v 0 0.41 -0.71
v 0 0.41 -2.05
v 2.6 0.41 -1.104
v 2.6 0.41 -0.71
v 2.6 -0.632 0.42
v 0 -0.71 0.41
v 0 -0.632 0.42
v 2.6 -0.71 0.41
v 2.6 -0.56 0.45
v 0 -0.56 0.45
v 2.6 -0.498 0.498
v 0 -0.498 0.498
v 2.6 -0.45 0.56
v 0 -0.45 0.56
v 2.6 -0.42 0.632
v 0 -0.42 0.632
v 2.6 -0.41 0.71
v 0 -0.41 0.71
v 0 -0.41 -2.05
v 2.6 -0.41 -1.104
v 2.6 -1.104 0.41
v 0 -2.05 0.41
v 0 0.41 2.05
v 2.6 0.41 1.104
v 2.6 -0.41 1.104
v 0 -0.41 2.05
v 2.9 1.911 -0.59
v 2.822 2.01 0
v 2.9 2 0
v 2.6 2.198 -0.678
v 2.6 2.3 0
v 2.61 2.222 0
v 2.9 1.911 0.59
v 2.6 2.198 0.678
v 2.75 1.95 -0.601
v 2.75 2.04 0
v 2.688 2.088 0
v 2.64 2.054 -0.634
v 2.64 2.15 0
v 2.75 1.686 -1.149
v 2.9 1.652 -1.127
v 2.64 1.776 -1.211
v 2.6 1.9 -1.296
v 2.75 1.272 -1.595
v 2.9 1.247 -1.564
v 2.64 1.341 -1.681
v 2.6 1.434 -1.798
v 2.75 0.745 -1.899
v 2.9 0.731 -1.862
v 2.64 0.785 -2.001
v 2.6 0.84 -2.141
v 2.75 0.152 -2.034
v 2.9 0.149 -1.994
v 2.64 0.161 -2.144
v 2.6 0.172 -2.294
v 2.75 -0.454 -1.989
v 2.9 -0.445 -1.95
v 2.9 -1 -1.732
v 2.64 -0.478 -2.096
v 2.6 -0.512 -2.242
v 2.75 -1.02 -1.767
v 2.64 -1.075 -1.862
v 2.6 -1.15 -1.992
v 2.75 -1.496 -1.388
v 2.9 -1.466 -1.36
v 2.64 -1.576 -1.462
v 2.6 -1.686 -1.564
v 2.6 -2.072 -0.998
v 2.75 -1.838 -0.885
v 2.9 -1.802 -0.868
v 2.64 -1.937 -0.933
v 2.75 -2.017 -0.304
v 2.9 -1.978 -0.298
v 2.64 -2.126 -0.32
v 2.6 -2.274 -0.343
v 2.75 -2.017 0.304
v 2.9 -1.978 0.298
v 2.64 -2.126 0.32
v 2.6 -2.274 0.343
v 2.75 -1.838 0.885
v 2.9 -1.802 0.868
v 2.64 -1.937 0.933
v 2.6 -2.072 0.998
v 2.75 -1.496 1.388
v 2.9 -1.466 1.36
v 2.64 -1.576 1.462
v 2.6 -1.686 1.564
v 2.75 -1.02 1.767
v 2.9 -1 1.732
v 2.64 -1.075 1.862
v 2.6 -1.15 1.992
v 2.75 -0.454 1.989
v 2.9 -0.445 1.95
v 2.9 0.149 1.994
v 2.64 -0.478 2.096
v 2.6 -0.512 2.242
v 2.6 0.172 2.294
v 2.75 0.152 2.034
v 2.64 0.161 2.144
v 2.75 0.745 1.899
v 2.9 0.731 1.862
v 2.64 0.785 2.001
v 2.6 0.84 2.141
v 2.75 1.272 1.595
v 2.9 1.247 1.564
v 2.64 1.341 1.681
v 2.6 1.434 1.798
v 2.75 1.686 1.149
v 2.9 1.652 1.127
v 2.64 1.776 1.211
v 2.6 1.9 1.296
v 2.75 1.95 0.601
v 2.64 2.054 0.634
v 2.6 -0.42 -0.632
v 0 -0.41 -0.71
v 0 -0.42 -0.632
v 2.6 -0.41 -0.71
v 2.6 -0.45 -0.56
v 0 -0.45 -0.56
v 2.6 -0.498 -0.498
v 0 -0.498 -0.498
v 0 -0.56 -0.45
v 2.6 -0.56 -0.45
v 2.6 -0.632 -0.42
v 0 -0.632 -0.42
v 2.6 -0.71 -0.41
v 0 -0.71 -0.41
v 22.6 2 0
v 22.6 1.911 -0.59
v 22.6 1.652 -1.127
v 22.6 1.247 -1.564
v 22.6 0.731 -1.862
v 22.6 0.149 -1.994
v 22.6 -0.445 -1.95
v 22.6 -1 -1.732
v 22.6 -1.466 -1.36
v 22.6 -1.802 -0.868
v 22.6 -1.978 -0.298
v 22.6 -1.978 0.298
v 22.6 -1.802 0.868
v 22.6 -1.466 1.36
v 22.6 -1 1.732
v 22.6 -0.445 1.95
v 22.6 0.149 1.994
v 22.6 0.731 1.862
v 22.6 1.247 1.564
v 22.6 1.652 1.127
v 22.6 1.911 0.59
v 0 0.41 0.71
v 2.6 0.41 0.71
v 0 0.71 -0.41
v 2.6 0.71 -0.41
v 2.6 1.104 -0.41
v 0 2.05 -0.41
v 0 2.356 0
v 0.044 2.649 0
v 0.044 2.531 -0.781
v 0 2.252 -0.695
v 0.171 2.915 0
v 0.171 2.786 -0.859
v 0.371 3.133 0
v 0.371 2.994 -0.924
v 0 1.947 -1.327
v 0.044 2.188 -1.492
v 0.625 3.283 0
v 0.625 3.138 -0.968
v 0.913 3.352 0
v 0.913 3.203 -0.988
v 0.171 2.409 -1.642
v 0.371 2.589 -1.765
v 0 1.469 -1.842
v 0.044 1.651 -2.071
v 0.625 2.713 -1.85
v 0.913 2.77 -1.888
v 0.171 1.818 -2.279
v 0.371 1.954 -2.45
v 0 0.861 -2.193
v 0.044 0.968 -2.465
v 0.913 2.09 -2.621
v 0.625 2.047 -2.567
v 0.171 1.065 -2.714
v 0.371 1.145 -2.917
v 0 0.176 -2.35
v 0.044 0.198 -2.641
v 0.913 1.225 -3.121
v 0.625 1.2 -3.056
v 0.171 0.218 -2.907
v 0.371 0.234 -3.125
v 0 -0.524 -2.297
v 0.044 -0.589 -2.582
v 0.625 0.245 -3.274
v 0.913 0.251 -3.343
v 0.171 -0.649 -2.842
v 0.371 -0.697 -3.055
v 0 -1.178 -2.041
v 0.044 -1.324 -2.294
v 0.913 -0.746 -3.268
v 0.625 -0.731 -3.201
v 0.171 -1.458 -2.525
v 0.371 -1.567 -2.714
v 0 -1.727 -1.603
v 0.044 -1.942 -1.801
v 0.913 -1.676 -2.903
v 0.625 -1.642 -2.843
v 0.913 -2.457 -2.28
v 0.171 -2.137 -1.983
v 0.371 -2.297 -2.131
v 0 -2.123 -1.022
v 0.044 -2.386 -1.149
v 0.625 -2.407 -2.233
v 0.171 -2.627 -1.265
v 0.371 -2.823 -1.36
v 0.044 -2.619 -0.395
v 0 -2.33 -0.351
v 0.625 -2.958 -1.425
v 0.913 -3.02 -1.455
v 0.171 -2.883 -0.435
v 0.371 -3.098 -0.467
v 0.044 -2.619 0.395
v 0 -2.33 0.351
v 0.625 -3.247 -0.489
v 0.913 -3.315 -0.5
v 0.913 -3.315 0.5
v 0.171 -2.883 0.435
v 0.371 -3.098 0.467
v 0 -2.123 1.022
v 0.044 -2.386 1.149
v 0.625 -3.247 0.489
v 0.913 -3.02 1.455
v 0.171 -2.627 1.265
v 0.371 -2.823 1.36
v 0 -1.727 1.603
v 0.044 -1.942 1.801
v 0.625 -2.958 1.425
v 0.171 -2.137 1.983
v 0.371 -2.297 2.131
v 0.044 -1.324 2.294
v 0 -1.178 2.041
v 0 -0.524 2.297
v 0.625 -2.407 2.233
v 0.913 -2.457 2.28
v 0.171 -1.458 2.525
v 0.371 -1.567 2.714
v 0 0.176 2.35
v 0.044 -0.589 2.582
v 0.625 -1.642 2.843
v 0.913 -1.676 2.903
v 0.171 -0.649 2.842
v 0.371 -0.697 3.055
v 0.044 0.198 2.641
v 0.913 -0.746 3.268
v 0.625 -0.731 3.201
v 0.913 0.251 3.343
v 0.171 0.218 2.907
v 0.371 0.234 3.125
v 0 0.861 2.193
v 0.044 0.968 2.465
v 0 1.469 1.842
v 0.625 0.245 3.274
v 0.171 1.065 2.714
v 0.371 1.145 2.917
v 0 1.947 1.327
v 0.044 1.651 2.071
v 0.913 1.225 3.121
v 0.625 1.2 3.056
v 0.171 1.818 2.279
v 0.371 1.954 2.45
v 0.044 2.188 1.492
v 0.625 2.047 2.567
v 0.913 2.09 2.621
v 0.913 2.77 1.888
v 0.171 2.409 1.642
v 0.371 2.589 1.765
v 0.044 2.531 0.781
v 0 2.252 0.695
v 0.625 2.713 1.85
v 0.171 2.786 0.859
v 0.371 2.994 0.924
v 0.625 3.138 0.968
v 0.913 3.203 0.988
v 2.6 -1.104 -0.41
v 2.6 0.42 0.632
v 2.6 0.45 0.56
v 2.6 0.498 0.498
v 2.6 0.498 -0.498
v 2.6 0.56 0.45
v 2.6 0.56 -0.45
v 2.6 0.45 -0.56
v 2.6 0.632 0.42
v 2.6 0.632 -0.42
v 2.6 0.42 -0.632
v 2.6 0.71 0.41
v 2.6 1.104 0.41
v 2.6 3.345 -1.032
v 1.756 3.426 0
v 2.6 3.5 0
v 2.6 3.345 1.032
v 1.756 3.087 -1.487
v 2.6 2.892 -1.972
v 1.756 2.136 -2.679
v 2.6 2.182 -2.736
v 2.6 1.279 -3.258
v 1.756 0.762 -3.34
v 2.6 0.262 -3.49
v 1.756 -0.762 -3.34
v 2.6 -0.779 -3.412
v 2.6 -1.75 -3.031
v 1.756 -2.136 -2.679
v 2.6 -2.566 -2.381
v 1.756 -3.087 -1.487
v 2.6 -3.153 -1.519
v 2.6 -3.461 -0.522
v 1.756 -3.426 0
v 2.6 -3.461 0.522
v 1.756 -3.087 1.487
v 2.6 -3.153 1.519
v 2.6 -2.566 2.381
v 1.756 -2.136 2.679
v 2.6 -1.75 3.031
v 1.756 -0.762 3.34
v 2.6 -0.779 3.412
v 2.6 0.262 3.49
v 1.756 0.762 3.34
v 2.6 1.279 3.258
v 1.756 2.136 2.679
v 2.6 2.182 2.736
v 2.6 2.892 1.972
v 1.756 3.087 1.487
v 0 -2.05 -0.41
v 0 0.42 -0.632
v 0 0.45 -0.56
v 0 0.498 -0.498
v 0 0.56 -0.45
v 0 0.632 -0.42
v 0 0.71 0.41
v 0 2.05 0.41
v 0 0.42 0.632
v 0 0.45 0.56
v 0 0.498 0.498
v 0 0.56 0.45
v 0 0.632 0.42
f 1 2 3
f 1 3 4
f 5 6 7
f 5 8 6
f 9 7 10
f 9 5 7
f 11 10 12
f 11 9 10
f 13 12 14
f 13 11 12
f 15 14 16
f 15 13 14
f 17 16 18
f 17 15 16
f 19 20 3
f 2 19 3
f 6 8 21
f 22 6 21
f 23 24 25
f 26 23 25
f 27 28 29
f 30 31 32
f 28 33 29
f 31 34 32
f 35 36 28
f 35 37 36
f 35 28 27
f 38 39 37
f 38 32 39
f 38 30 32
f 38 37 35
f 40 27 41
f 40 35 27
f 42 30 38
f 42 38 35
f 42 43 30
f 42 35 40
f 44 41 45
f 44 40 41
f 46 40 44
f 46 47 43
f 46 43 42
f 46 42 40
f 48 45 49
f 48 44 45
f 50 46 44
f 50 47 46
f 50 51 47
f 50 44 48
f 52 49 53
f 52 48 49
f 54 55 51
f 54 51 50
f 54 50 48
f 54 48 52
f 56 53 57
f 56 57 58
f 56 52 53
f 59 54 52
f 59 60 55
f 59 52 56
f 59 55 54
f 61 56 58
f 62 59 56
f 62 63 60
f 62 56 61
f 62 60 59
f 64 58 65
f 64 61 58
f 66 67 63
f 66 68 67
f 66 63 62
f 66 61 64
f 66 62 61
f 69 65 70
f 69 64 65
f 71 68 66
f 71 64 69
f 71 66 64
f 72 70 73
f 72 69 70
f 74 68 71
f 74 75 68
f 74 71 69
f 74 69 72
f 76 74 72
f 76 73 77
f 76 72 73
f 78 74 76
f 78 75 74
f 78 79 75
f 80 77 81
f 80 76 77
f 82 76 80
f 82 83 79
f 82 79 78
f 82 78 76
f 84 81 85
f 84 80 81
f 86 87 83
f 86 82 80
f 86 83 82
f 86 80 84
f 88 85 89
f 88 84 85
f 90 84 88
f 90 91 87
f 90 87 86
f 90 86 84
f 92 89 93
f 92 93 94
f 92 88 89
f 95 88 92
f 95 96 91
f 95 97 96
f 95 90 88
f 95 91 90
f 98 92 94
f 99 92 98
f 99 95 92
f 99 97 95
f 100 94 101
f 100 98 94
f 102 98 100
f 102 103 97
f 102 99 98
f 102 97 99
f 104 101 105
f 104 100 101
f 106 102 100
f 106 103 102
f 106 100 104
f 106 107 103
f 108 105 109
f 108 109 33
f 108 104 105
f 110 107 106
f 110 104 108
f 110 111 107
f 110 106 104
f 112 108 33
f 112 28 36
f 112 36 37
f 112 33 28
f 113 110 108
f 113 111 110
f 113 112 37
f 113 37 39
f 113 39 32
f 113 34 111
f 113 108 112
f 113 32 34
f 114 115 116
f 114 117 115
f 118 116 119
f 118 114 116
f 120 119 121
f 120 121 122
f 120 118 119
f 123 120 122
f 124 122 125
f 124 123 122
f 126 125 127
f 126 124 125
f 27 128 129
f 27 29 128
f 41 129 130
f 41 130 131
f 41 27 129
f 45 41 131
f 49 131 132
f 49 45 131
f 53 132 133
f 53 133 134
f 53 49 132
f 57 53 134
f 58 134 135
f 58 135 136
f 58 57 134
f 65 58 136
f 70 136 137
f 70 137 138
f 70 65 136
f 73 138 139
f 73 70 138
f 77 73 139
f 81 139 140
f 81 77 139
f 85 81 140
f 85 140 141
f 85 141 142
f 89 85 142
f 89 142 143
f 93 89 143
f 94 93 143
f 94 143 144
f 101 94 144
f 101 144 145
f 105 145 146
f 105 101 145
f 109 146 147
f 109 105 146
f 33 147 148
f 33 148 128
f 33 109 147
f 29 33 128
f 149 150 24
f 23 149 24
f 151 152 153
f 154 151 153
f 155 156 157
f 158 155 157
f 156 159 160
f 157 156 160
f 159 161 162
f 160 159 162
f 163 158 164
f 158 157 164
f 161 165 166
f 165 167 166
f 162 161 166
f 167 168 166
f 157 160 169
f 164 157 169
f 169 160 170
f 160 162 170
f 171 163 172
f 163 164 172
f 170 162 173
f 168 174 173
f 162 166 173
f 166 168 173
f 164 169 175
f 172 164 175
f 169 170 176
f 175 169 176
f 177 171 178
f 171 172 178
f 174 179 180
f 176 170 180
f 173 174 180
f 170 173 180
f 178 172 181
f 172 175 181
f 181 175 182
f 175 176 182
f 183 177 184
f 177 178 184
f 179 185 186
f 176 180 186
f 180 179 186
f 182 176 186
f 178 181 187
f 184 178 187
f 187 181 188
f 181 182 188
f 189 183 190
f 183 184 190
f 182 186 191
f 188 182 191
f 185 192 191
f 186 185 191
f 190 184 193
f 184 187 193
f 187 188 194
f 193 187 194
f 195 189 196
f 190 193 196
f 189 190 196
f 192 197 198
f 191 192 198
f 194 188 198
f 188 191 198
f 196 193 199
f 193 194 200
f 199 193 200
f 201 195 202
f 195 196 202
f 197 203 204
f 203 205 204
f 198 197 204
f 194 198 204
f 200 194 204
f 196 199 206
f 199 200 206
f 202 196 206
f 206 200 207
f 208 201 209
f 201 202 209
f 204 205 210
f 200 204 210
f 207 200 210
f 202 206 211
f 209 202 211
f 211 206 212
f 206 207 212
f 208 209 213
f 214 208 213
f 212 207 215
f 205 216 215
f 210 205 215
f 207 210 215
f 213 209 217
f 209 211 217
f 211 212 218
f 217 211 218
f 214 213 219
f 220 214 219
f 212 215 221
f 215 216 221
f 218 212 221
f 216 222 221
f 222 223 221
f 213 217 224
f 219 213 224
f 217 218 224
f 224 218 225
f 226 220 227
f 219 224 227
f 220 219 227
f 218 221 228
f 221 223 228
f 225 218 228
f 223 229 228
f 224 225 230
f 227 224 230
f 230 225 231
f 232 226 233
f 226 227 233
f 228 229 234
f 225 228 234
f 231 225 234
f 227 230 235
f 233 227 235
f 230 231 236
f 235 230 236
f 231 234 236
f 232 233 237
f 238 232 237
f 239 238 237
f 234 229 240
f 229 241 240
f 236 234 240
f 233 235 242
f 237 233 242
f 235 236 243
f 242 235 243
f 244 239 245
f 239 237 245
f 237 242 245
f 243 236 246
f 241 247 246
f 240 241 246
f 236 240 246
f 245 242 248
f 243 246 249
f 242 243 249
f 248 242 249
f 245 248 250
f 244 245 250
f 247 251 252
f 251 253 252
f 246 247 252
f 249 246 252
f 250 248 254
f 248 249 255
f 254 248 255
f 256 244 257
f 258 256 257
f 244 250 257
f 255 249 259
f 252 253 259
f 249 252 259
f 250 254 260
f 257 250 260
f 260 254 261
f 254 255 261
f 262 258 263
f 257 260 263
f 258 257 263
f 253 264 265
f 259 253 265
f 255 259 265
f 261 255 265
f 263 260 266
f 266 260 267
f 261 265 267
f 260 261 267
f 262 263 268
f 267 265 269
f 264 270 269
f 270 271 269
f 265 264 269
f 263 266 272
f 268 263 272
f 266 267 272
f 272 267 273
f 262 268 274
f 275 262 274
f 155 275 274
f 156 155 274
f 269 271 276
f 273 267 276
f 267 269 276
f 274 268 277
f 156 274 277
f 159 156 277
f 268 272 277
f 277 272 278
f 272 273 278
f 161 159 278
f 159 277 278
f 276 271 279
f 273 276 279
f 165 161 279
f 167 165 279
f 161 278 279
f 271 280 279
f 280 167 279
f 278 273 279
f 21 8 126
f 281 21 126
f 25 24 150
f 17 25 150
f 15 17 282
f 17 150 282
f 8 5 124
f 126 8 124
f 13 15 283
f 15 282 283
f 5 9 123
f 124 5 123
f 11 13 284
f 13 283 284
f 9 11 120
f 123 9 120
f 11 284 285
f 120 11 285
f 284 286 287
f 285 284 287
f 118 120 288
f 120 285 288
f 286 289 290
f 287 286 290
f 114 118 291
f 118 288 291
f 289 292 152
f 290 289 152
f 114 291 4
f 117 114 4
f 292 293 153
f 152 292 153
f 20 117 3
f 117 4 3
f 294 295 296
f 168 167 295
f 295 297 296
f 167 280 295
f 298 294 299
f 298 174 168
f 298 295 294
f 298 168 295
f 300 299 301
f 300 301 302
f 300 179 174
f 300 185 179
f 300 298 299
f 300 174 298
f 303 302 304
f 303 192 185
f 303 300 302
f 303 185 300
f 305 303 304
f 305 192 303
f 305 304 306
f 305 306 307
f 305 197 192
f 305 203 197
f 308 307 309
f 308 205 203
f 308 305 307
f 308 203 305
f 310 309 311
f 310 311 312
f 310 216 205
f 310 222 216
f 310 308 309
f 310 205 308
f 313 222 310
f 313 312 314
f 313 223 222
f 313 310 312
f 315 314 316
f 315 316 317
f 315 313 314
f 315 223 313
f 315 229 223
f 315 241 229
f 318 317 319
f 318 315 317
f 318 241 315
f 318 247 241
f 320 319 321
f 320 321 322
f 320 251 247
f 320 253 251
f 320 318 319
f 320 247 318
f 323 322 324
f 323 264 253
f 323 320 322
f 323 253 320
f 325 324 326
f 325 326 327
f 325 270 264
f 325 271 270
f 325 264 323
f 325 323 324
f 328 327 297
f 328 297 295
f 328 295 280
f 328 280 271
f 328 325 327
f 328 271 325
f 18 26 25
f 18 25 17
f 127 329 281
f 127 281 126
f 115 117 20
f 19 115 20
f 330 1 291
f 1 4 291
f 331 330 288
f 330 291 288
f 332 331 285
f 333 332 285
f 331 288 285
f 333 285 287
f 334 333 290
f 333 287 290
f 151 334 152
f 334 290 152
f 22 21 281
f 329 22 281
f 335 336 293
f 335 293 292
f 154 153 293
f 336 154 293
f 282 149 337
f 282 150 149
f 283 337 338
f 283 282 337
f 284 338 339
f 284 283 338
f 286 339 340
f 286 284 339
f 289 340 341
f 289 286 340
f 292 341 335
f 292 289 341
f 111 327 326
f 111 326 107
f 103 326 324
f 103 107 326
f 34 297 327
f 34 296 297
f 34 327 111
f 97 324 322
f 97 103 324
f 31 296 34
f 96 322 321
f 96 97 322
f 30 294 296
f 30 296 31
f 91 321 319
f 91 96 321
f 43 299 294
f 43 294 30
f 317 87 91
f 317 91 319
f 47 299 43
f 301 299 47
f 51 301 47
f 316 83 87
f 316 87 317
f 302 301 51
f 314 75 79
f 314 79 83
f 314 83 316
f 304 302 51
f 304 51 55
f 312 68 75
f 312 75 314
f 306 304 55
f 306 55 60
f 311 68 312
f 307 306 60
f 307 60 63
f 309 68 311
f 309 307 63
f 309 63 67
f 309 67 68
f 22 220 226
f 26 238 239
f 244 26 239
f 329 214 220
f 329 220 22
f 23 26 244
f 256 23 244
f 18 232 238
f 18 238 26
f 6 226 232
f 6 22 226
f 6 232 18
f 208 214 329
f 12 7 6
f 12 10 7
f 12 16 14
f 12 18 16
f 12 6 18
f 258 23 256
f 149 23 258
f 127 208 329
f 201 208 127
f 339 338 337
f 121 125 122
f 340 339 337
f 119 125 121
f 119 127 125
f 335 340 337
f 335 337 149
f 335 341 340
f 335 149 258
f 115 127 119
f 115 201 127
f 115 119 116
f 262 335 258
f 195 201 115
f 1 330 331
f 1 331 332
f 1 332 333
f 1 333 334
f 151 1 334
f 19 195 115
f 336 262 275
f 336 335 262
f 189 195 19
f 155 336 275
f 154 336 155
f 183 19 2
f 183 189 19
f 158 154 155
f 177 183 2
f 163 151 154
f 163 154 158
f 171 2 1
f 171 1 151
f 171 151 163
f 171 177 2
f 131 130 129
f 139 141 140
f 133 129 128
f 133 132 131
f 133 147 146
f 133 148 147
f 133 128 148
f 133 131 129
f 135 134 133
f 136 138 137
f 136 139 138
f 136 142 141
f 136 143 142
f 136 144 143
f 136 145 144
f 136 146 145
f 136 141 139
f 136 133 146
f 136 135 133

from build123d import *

# Parameters (mm, degrees)
CROSSRECESS_DEPTH = 2.6
FILLET5_R         = 0.3
HEADFILLET_R      = 1
DRAFT1_ANGLE      = 20


with BuildPart() as part:
    # Sketch1 → Base (revolve)
    with BuildSketch(Plane.XY):
        with BuildLine():
            Line((22.6, 2), (4, 2))
            Line((4, 2), (2.9, 2))
            ThreePointArc((2.9, 2), (2.687867966, 2.087867966), (2.6, 2.3))
            Line((2.6, 2.3), (2.6, 3.5))
            Line((2.6, 3.5), (0, 3.272529475))
            Line((0, 3.272529475), (0, 0))
            Line((0, 0), (22.6, 0))
            Line((22.6, 0), (22.6, 2))
        make_face()
    revolve(axis=Axis((4.515812911, 0, 0), (-1, 0, 0)))

    # Sketch6 → CrossRecess (cut)
    with BuildSketch(Plane(origin=(0, 0, 0), x_dir=(0, 0, -1), z_dir=(1, 0, 0))):
        Polygon((0.41, 0.41), (0.41, 2.05), (-0.41, 2.05), (-0.41, 0.41), (-2.05, 0.41), (-2.05, -0.41), (-0.41, -0.41), (-0.41, -2.05), (0.41, -2.05), (0.41, -0.41), (2.05, -0.41), (2.05, 0.41), align=None)
    extrude(amount=CROSSRECESS_DEPTH, mode=Mode.SUBTRACT)

    # Fillet5
    fillet5_edges = [part.edges().sort_by_distance(p)[0] for p in [
        (1.3, 0.41, 0.41),
        (1.3, -0.41, 0.41),
        (1.3, -0.41, -0.41),
        (1.3, 0.41, -0.41),
    ]]
    fillet(fillet5_edges, radius=FILLET5_R)

    # HeadFillet
    headfillet_edges = [part.edges().sort_by_distance(p)[0] for p in [
        (0, -3.272529475, 0),
    ]]
    fillet(headfillet_edges, radius=HEADFILLET_R)

    # Draft1
    draft1_faces = [part.faces().sort_by_distance(p)[0] for p in [
        (1.3, 0, 2.05),
        (1.3, -2.05, 0),
        (1.3, 0, -2.05),
        (1.3, 2.05, 0),
    ]]
    draft(draft1_faces, Plane(origin=(0, 0, 0), x_dir=(0, 0, -1), z_dir=(-1, 0, 0)), DRAFT1_ANGLE)


solid = part.part
